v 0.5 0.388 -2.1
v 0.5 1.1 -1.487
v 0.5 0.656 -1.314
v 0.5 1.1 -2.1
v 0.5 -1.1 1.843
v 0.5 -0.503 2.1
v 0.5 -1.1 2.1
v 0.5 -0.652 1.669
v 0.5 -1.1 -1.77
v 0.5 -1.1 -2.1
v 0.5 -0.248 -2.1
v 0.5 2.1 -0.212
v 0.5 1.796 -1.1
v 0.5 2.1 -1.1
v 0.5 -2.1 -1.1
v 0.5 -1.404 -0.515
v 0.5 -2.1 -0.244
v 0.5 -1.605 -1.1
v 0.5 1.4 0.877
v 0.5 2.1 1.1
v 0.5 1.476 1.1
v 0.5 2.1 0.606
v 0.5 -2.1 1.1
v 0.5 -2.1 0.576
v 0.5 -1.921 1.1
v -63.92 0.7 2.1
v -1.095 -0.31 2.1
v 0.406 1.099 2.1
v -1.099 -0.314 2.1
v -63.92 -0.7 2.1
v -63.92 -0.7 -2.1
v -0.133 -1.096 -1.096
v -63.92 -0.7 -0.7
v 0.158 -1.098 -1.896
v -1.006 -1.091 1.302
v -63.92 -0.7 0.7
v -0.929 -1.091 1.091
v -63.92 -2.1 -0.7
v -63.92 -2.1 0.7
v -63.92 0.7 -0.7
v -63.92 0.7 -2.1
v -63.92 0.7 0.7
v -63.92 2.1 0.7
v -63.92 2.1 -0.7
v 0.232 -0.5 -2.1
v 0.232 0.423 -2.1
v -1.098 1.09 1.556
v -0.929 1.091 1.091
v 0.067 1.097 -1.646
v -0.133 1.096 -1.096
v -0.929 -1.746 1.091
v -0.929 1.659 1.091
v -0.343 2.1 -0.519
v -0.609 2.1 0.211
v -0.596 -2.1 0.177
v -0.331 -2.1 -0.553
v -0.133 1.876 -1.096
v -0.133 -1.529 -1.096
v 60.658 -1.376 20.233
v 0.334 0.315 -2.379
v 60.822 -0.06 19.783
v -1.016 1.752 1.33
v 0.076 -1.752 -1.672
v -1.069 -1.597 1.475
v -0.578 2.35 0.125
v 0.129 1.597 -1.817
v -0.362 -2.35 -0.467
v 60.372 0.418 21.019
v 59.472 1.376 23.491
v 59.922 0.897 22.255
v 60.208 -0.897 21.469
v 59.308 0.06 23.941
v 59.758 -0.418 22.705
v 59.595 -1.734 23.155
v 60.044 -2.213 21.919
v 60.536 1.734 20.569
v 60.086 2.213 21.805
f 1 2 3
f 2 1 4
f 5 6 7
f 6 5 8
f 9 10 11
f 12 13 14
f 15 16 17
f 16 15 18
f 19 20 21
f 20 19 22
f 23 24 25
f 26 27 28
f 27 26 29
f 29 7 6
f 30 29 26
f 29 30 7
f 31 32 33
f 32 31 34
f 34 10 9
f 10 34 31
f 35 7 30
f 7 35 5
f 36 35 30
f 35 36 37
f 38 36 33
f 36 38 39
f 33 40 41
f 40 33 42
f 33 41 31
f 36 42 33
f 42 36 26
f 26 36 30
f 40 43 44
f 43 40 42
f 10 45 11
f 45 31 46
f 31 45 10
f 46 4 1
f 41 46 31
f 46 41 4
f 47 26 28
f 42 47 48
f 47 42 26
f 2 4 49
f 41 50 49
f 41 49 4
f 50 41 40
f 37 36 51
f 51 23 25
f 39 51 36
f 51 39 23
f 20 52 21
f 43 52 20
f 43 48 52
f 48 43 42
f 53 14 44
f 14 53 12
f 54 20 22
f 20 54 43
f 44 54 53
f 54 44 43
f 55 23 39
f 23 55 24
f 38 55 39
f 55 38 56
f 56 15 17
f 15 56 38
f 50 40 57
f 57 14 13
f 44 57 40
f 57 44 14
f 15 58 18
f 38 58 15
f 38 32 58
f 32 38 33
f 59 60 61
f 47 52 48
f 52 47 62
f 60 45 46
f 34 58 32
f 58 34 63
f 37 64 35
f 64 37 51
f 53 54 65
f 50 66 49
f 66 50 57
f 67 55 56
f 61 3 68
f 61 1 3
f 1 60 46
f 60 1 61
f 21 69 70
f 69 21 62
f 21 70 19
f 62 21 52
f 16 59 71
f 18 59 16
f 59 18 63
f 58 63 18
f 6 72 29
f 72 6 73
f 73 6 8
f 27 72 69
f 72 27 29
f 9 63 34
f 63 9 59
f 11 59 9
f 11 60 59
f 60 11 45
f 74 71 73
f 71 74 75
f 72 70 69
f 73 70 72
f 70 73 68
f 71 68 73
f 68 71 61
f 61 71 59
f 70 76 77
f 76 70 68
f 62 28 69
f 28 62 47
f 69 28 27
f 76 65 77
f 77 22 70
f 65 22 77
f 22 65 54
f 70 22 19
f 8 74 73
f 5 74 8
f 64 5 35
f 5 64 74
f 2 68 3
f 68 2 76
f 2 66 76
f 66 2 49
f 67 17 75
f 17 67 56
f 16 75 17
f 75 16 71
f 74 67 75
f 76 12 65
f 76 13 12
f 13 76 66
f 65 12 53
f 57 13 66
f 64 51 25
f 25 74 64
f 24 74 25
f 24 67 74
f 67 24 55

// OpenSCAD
// Test objects for compatibility with LEGO(r) Technic axles
// and '+' shaped axle-holes
//
// NOTE regarding Patents: Since 1977 the LEGO Group has produced "Technic"
// elements with gear teeth, axles, axle-holes, and other features closely
// resembling the design(s) in this file, as part of their "Expert Builder"
// and "Technical Sets", now called "Technic" (see for example set 961,
// peeron.com/inv/sets/961-1?showpic=9288 ). By 1989 they had added pieces
// with rounded ends (see peeron.com/inv/sets/5264-1?showpic=8542 (set 5264
// from 1987) and peeron.com/inv/sets/5110-2?showpic=8543 (set 5110 from 1989))
// The object(s) produced by this SCAD file are different from real LEGO(r)
// elements, and any similarities of features, such as the shapes of axles
// and axle-holes, are functional in nature. The functions in question
// resemble those in LEGO patents that have already expired (or, if not
// patented, became prior art when the product(s) became available for
// purchase, i.e. 1989 at the latest). Nevertheless, one must not infringe
// on non-expired patents and any non-patent rights, such as LEGO(r)
// trademarks and brand identity. An example of such infringement would be
// to make objects and then try to "pass them off" as LEGO products. See
// for example the Kirkbi AG v. Ritvik Holdings Inc. case, (Supreme Court of
// Canada [2005] 3 S.C.R. 302).
//
// Originally created by Robert Munafo (mrob27 on Thingiverse)
//
// Instructions:
//  * Print this out on your 3D printer. It is two '+' shaped axles that taper
//    and are joined at the thickest end.
//
//  * Use a permanent marker to make some evenly-spaced marks. For example you
//    could make three marks on each half of the object, like this:
//   
//  1.4      1.6      1.8      2.0      2.2      2.0      1.8      1.6      1.4
//   +--------|--------|--------|--------X--------|--------|--------|--------+
//  end (thinnest)               middle (thickest)                     end (thinnest)
//
//    each '|' is a mark, and the numbers represent the nominal thickness (in
//    millimeters) at that point along the object.
//
// * Now try inserting both '+' shaped ends into a LEGO(r) element with a '+'
//   shaped hole. Because this object is tapered, it will not go in all the
//   way. Where it stops will depend on the precise details of how your 3D
//   printer creates objects shaped like this. Using the marks you made in step 2,
//   note where it stops, and convert this to a number. Use this number as the
//   value for the "X_thick" variable in other SCAD files that create
//   Technic-compatible axles.
//
// NOTE: The results you get here will not necessarily agree with the results you
// get for creating the HOLE that an axle fits into. Use the separate test object
// "xhole-test.scad" to calibrate how your printer deals with the inside dimensions
// of an '+' shaped hole.
//
//  20130106: first version.

jaggy_angle = 20;
lss = 7.99; // LEGO(r) Stud Spacing (see mrob.com/pub/mcg.html#lss )

// Outside diameter of axles is actually more like 4.8, but we want to make sure our
// test axles fit, so we make this a little smaller.
axle_diameter = 4.2;

// X_thick is the nominal thickness of one of the "arms" of the X-shaped cross
// section of a Technic axle. Using a micrometer, I measured about 1.8 millimeters.
//   However, if you use a 3D printer to make an object of a certain thickness, the
// actual result will be thicker or thinner than what you asked for. There are many
// factors that affect the results, including the type of material, the "resolution"
// of the printer, condition of the printer nozzle(s) and other key components,
// and perhaps even environmental factors such as ambient temperature.
//   So we make a tapered object, which can be used to figure out exactly how
// thick your 3D printer wants to make the object.

X_thick = 1.8;  // Nominal, "real" or "standard" dimension
min_X_thick = X_thick - 0.4;
max_X_thick = X_thick + 0.4;

// Make each end of the axle 8 studs long.
length = 8.0 * lss;

// We make two tapered axles, one is aligned with the X-Y-Z axes in a sensible way,
// but the other is skewed by 20 degrees to take advantage of jagged pixels.
// Jagged pixels give us more precise control over the actual thickness of an object.
for (j = [180, -jaggy_angle]) {
  rotate([0, j, 0]) {
    // The for(i) loop is to create two "rectangles" at right angles which combine to
    // make a '+'
    for (i = [j, j+90]) {
      rotate([i,0,0]) {
        // It only needs to taper along the length direction which is the X axis.
        // To make it taper we'll vary the Y coordinate a little bit. In the third
        // dimension (Z) there is no tapering so we can make our tapered shape by
        // simply extruding a trapezoid into the Z dimension.
        linear_extrude(height = axle_diameter,
                       center = true, convexity = 0, twist = 0) {
          polygon( points = [
            [-0.5,   -0.5 * max_X_thick],
            [length, -0.5 * min_X_thick],
            [length,  0.5 * min_X_thick],
            [-0.5,    0.5 * max_X_thick]
          ], convexity = 0);
        }
      }
    }
  }
}
